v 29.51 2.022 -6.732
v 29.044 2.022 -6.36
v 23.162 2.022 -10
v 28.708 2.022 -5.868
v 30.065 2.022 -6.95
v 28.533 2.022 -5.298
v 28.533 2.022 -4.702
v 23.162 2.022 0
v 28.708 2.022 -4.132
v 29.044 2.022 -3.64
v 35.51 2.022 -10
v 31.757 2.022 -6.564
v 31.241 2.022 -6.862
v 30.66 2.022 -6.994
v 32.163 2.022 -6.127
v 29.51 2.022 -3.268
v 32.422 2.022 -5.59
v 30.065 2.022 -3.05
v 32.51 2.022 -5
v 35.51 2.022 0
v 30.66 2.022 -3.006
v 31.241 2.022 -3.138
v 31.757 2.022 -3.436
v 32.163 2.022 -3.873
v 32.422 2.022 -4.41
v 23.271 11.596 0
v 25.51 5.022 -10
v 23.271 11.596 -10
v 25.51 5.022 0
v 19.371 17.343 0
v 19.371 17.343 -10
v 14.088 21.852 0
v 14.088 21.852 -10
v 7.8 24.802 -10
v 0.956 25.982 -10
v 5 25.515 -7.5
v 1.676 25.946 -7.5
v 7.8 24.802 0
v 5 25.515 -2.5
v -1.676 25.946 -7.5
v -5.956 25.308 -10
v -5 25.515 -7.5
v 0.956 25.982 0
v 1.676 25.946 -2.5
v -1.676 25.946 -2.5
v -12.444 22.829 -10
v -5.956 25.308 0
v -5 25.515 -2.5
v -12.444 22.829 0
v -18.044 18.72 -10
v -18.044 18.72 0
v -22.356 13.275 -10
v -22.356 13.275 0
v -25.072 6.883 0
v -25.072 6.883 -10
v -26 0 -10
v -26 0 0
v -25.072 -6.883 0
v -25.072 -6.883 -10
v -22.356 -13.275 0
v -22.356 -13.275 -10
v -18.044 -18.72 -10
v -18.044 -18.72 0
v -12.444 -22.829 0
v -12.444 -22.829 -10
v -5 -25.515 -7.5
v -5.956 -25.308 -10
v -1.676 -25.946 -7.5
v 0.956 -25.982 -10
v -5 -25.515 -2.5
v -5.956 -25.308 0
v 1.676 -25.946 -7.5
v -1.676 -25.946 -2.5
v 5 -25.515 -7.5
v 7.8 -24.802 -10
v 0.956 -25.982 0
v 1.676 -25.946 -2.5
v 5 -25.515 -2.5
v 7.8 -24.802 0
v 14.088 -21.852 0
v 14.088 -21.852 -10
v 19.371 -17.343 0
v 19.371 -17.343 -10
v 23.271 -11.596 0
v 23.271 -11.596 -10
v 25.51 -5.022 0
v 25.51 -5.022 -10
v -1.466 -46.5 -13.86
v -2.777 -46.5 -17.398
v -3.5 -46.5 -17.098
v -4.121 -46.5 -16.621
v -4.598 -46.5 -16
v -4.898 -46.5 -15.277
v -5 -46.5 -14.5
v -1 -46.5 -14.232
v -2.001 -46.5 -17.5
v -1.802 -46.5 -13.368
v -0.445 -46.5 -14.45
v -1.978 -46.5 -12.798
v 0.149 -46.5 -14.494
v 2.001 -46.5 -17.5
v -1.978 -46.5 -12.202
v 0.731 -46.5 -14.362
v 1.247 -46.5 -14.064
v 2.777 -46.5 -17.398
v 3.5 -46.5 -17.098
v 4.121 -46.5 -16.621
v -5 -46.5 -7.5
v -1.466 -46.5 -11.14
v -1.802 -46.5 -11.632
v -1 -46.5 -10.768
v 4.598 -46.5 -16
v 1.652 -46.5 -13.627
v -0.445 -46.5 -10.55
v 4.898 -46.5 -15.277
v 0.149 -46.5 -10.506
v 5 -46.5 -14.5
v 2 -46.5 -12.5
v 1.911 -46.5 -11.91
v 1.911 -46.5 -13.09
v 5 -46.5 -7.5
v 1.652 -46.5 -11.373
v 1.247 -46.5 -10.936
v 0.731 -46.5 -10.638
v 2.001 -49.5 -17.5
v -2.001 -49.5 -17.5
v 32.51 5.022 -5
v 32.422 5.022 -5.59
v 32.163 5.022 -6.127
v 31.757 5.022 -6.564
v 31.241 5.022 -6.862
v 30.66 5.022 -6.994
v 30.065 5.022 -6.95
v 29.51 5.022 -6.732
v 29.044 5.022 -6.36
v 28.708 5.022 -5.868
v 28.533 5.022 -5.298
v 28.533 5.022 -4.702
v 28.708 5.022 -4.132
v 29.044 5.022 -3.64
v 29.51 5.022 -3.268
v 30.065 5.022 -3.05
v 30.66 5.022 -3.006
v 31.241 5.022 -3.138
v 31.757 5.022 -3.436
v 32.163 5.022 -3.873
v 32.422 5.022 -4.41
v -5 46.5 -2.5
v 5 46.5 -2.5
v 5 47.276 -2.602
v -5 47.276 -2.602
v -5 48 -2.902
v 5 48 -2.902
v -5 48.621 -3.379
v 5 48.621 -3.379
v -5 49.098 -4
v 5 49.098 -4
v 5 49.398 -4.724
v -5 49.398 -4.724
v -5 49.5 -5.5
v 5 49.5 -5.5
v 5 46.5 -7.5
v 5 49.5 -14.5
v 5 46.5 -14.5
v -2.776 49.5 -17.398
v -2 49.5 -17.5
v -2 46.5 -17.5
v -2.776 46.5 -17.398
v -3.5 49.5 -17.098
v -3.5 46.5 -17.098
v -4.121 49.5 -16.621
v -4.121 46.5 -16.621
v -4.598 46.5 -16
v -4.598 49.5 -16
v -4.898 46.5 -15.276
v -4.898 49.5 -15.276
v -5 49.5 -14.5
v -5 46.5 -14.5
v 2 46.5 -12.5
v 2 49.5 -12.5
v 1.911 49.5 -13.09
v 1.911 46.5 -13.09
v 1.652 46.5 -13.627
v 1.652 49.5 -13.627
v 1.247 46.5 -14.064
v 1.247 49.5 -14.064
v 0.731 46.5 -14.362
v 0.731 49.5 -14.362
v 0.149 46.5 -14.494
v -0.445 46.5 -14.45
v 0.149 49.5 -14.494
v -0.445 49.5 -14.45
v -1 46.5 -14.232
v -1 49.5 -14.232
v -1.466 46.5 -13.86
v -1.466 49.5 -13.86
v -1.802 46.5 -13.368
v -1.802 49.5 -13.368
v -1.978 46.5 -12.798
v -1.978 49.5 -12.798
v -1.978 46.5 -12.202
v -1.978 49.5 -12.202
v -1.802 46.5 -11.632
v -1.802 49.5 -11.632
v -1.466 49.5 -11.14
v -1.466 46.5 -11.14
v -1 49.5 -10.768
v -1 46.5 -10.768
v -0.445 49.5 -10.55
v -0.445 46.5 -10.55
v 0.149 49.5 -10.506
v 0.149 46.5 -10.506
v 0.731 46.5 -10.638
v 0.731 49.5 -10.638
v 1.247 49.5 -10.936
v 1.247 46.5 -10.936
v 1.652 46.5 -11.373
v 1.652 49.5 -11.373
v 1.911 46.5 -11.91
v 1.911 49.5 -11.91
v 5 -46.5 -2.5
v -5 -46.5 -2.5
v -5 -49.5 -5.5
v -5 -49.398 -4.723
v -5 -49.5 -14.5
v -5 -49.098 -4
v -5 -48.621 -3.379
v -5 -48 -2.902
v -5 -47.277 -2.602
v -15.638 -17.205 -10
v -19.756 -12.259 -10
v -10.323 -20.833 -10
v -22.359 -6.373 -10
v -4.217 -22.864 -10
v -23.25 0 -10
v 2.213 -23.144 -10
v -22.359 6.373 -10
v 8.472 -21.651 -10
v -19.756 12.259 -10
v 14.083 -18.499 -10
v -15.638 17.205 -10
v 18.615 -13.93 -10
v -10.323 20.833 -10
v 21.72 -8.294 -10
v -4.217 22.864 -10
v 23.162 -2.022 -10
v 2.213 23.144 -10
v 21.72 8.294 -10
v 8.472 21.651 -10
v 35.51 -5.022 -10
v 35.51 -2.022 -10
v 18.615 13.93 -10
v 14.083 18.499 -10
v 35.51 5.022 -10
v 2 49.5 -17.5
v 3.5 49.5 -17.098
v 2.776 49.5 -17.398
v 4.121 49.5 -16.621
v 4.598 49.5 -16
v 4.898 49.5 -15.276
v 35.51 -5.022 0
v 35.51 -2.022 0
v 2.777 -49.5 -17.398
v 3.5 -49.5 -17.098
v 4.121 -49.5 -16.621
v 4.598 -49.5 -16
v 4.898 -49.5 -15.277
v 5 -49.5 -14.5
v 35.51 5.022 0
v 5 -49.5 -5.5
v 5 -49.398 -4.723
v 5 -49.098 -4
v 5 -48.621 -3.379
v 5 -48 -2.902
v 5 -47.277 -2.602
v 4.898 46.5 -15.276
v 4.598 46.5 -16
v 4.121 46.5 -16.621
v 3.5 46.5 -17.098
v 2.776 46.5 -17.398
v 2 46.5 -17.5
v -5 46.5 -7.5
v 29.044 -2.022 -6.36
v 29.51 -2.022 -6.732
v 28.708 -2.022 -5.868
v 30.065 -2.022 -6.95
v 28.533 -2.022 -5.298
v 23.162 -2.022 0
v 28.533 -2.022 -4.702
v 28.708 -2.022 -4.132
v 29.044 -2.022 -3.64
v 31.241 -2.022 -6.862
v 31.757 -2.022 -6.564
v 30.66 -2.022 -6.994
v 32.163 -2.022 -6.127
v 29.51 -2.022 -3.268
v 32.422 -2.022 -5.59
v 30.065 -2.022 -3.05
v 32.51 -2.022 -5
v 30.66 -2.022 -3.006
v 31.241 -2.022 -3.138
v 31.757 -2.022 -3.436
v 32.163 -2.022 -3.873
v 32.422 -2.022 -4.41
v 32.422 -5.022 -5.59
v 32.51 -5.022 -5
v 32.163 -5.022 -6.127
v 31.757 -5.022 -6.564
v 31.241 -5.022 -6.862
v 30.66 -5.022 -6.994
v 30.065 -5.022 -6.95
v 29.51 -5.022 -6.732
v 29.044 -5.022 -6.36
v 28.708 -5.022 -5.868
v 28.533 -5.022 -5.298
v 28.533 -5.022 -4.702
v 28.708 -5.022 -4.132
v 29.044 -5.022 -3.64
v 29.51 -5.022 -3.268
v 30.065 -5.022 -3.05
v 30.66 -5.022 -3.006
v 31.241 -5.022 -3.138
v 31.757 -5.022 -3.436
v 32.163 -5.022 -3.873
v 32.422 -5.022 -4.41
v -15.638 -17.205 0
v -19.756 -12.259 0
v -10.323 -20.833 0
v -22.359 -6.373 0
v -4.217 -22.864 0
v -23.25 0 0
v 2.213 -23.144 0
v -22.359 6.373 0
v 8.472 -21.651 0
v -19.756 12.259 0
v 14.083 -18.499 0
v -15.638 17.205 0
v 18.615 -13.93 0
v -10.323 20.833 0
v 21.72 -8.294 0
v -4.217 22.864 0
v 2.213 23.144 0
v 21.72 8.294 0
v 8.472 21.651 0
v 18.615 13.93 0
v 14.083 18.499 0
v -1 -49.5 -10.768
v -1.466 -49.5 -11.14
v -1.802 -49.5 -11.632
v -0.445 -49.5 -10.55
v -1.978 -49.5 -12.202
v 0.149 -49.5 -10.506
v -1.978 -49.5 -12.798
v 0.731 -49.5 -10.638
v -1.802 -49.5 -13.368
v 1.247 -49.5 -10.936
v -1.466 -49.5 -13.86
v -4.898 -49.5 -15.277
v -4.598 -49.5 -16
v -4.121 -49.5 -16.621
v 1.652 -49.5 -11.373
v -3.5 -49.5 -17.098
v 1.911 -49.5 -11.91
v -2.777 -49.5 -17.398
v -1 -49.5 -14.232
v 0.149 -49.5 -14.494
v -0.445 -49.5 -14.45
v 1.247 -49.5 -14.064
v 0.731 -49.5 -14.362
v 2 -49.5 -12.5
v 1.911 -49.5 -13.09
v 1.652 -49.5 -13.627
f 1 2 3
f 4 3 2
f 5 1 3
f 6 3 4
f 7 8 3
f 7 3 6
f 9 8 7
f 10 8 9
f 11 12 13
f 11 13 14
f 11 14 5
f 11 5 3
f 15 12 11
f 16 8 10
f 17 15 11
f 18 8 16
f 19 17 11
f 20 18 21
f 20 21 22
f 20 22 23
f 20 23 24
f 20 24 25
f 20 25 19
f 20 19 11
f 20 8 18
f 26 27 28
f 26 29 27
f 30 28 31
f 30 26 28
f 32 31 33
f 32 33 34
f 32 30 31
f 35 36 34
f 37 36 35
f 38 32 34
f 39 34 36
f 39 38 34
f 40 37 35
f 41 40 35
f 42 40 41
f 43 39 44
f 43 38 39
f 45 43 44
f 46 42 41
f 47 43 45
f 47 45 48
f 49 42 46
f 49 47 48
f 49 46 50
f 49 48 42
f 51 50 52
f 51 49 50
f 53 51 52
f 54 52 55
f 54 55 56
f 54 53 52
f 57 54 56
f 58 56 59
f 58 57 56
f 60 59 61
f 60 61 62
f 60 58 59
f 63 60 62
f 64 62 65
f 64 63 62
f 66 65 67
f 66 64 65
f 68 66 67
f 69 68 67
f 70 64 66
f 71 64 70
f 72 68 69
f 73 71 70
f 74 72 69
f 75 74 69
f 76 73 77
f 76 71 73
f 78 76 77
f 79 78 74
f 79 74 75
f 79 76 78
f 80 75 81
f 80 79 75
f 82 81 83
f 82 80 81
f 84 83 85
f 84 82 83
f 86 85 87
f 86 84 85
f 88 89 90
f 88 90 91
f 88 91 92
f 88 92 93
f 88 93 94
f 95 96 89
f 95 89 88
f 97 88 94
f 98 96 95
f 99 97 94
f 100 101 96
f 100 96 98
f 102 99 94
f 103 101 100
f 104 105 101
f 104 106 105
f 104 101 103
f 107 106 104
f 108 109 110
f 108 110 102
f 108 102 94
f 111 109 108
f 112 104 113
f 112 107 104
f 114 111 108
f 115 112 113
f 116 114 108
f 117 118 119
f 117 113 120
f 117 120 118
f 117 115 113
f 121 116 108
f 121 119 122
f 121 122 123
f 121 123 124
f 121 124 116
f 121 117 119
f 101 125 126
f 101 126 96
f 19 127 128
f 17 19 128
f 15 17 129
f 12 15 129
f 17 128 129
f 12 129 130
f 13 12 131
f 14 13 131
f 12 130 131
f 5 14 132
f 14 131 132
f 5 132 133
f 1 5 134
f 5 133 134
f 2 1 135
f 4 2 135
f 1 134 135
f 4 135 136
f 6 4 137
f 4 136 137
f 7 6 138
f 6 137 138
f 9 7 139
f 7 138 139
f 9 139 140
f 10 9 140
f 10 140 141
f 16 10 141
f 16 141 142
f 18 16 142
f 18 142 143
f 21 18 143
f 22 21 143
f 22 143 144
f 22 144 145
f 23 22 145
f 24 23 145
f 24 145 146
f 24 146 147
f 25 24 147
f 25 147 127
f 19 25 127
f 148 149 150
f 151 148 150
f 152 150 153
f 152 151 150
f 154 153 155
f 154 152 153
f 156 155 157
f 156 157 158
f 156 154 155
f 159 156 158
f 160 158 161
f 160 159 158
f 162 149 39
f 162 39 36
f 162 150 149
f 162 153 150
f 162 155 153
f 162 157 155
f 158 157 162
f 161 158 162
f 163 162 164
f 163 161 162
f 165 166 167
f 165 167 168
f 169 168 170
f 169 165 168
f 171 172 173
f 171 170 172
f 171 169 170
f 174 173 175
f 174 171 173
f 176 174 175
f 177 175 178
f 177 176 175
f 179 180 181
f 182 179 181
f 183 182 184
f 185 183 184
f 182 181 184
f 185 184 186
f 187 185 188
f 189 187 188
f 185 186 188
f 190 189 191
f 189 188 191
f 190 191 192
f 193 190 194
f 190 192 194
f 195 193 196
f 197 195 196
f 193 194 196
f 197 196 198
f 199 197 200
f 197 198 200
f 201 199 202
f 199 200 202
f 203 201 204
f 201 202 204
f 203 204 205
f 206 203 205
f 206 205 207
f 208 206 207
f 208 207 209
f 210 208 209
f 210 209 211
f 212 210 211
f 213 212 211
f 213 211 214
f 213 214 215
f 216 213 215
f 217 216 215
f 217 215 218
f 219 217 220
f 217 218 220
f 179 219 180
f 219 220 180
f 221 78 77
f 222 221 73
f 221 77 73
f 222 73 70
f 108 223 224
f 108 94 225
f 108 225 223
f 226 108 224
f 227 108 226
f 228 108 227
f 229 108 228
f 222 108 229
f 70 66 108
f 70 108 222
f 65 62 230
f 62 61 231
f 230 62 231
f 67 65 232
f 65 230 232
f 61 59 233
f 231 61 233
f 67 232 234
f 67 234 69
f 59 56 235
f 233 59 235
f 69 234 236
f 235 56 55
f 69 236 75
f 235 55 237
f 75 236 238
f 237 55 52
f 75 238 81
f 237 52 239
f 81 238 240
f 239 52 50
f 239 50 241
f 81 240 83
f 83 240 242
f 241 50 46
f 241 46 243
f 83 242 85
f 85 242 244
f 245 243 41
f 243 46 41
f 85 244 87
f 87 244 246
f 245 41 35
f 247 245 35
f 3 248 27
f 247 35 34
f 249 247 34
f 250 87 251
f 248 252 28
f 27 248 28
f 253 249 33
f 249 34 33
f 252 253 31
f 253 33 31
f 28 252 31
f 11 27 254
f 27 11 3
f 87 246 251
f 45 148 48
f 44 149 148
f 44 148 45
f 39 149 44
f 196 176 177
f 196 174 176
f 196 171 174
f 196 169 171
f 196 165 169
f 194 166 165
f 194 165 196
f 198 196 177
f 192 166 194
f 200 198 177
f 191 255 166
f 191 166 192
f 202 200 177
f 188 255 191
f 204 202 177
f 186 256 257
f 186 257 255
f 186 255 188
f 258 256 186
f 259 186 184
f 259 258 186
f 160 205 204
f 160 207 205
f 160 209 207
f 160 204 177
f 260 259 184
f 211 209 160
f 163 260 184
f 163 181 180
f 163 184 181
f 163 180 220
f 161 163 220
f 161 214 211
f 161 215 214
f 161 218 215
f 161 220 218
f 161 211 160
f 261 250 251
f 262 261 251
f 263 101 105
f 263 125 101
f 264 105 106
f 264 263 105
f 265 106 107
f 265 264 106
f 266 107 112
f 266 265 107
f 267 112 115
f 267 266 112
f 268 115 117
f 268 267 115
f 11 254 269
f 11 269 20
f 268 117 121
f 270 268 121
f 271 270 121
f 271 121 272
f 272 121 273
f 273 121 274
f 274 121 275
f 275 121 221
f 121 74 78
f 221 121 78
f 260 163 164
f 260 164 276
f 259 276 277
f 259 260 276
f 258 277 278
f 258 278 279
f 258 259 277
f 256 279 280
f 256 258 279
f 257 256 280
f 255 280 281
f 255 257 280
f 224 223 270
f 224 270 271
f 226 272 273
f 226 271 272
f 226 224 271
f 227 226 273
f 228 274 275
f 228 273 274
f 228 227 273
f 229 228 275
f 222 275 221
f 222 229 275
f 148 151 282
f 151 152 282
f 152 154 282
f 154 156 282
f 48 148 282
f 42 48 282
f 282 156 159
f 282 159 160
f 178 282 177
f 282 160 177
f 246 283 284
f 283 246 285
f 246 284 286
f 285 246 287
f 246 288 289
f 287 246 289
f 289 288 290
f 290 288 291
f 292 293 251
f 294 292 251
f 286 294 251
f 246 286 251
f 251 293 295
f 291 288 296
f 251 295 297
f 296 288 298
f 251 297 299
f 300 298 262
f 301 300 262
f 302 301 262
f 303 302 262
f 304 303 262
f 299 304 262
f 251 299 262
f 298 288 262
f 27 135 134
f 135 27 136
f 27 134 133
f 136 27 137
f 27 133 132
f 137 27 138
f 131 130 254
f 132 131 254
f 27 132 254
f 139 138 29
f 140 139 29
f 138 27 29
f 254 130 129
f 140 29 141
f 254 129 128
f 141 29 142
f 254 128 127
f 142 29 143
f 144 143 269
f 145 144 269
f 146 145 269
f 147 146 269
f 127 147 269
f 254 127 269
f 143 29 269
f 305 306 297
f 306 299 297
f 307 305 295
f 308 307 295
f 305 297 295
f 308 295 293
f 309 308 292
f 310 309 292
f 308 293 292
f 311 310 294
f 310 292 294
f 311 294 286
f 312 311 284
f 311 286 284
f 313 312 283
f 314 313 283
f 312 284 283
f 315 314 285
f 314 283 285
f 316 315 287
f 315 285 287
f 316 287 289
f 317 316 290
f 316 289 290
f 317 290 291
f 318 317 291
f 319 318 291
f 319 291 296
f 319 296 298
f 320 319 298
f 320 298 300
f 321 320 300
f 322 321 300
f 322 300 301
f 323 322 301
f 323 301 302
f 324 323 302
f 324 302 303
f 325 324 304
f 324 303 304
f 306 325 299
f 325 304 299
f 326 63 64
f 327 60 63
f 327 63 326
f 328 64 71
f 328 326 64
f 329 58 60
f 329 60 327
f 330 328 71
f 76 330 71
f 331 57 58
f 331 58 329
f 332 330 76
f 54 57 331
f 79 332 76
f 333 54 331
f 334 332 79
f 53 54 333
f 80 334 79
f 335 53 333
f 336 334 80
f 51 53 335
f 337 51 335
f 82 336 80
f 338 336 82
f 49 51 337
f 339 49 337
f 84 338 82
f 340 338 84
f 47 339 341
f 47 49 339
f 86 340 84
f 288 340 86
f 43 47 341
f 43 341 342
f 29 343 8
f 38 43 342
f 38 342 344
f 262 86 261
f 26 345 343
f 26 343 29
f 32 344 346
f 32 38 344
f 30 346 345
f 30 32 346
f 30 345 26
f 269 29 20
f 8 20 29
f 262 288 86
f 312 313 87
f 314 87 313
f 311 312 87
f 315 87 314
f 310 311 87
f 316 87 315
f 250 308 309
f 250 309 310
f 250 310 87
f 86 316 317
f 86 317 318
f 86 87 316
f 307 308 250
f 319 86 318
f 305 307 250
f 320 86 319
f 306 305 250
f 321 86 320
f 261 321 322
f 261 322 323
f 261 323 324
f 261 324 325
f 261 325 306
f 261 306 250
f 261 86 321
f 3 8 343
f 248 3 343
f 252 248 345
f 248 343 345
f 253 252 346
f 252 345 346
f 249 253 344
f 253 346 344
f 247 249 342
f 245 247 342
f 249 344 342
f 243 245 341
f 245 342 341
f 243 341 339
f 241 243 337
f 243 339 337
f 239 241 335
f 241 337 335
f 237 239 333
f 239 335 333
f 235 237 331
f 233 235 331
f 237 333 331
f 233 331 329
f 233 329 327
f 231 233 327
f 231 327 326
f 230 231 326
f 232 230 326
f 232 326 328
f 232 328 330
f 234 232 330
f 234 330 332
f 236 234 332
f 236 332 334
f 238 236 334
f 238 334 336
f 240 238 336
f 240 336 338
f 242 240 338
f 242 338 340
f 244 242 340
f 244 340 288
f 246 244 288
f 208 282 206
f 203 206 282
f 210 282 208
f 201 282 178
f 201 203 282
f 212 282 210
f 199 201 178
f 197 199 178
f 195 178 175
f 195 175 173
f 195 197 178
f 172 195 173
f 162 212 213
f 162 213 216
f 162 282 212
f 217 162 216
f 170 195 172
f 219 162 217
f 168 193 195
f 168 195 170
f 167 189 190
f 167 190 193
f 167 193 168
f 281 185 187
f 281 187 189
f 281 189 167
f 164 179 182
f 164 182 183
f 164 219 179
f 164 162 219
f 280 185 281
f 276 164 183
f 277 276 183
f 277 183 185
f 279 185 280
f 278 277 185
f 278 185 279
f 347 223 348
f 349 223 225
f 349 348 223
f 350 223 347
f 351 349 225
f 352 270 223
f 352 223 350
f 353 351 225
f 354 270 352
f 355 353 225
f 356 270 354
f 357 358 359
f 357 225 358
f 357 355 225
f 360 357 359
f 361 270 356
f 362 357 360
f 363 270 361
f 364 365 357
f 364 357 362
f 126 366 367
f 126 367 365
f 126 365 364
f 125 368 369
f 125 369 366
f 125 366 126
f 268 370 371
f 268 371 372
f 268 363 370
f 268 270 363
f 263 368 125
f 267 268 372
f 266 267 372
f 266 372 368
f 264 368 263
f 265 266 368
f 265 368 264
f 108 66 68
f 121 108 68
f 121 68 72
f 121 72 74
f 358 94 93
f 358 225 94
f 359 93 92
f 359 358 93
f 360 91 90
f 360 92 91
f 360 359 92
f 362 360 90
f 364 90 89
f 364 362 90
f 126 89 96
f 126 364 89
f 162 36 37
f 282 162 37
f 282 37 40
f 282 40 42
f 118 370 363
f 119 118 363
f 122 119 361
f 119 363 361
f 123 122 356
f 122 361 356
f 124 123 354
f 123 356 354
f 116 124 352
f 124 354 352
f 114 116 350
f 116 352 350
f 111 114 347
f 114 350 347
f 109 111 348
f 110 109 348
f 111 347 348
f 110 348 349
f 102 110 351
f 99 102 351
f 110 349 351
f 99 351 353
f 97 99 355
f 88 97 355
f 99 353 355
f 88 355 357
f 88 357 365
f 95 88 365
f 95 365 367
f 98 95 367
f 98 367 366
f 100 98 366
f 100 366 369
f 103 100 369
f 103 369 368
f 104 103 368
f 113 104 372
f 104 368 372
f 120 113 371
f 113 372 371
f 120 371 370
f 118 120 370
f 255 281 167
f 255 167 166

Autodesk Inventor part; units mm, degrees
sketch "Sketch1" plane through (0, 0, 0) normal (0, 0, 1) x (1, 0, 0)
  arc A0 (23.1619, 2.0217) -> (23.1619, -2.0217) centre (0, 0) ccw
  arc A1 (25.5104, 5.0217) -> (25.5104, -5.0217) centre (0, 0) ccw
  line L0 (23.1619, 2.0217) -> (35.5104, 2.0217)
  line L1 (25.5104, 5.0217) -> (35.5104, 5.0217)
  line L2 (35.5104, 5.0217) -> (35.5104, 2.0217)
  line L3 (0, 0) -> (18.0567, 0)
  line L4 (23.1619, -2.0217) -> (35.5104, -2.0217)
  line L5 (25.5104, -5.0217) -> (35.5104, -5.0217)
  line L6 (35.5104, -5.0217) -> (35.5104, -2.0217)
  dimension "d0" = 46.5
  dimension "d1" = 52
  dimension "d33" = 3
  dimension "d34" = 10
extrude "Extrusion1" add sketch "Sketch1" against normal blind 10
sketch "Sketch2" plane through (24.6779, 5.0217, 0) normal (0, 1, 0) x (1, 0, 0)
  line L0 (10.8325, 0) -> (0.8325, 0) projected
  line L1 (10.8325, 0) -> (10.8325, 10) projected
  line L2 (0.8325, 10) -> (10.8325, 10) projected
  line L3 (0.8325, 0) -> (0.8325, 10) projected
  circle A0 centre (5.8325, 5) radius 2
  point P0 (-24.6779, 0)
  dimension "d35" = 4
extrude "Extrusion2" cut sketch "Sketch2" against normal blind 11 contours A0
ref_plane "Work Plane3" through (24.6779, 24, 0) normal (0, 1, 0) x (1, 0, 0)
sketch "Sketch3" plane through (24.6779, 24, 0) normal (0, 1, 0) x (1, 0, 0)
  line L0 (-24.6779, 0) -> (-24.6779, 10)
  line L1 (-19.6779, 7.5) -> (-29.6779, 7.5)
  line L2 (-29.6779, 2.5) -> (-19.6779, 2.5)
  line L3 (-19.6779, 2.5) -> (-19.6779, 7.5)
  line L4 (-29.6779, 2.5) -> (-29.6779, 7.5)
  point P0 (-24.6779, 5)
extrude "Extrusion3" add sketch "Sketch3" along normal blind 22.5
ref_plane "Work Plane4" through (5, 25.5147, -6) normal (1, 0, 0) x (0, 0, -1)
sketch "Sketch4" plane through (5, 25.5147, -6) normal (1, 0, 0) x (0, 0, -1)
  line L0 (-3.5, 20.9853) -> (1.5, 20.9853) projected
  line L1 (-3.5, 20.9853) -> (11.5, 20.9853)
  line L2 (11.5, 20.9853) -> (11.5, 23.9853)
  line L3 (11.5, 23.9853) -> (-3.5, 23.9853)
  line L4 (-3.5, 23.9853) -> (-3.5, 20.9853)
  point P0 (-6, -24.4949)
  dimension "d36" = 15
  dimension "d37" = 3
extrude "Extrusion4" add sketch "Sketch4" against normal blind 10
ref_plane "Work Plane2" through (0, 0, 0) normal (0.7071, -0.7071, 0) x (0, 0, -1)
sketch "Sketch5" plane through (5, 49.5, -2.5) normal (0, 1, 0) x (1, 0, 0)
  circle A0 centre (-5, 10) radius 2
  dimension "d29" = 4
extrude "Extrusion5" cut sketch "Sketch5" against normal blind 4
fillet "Fillet2" radius 3 3 edges at (0, 49.5, -2.5) (5, 48, -17.5) (-5, 48, -17.5)
mirror "Mirror3" about plane through (0, 0, 0) normal (0, 1, 0) of "Extrusion4", "Fillet2", "Extrusion3", "Extrusion5"
properties part number "SupportBracket_v2_BilgePumpMotor" material "ABS Plastic"
